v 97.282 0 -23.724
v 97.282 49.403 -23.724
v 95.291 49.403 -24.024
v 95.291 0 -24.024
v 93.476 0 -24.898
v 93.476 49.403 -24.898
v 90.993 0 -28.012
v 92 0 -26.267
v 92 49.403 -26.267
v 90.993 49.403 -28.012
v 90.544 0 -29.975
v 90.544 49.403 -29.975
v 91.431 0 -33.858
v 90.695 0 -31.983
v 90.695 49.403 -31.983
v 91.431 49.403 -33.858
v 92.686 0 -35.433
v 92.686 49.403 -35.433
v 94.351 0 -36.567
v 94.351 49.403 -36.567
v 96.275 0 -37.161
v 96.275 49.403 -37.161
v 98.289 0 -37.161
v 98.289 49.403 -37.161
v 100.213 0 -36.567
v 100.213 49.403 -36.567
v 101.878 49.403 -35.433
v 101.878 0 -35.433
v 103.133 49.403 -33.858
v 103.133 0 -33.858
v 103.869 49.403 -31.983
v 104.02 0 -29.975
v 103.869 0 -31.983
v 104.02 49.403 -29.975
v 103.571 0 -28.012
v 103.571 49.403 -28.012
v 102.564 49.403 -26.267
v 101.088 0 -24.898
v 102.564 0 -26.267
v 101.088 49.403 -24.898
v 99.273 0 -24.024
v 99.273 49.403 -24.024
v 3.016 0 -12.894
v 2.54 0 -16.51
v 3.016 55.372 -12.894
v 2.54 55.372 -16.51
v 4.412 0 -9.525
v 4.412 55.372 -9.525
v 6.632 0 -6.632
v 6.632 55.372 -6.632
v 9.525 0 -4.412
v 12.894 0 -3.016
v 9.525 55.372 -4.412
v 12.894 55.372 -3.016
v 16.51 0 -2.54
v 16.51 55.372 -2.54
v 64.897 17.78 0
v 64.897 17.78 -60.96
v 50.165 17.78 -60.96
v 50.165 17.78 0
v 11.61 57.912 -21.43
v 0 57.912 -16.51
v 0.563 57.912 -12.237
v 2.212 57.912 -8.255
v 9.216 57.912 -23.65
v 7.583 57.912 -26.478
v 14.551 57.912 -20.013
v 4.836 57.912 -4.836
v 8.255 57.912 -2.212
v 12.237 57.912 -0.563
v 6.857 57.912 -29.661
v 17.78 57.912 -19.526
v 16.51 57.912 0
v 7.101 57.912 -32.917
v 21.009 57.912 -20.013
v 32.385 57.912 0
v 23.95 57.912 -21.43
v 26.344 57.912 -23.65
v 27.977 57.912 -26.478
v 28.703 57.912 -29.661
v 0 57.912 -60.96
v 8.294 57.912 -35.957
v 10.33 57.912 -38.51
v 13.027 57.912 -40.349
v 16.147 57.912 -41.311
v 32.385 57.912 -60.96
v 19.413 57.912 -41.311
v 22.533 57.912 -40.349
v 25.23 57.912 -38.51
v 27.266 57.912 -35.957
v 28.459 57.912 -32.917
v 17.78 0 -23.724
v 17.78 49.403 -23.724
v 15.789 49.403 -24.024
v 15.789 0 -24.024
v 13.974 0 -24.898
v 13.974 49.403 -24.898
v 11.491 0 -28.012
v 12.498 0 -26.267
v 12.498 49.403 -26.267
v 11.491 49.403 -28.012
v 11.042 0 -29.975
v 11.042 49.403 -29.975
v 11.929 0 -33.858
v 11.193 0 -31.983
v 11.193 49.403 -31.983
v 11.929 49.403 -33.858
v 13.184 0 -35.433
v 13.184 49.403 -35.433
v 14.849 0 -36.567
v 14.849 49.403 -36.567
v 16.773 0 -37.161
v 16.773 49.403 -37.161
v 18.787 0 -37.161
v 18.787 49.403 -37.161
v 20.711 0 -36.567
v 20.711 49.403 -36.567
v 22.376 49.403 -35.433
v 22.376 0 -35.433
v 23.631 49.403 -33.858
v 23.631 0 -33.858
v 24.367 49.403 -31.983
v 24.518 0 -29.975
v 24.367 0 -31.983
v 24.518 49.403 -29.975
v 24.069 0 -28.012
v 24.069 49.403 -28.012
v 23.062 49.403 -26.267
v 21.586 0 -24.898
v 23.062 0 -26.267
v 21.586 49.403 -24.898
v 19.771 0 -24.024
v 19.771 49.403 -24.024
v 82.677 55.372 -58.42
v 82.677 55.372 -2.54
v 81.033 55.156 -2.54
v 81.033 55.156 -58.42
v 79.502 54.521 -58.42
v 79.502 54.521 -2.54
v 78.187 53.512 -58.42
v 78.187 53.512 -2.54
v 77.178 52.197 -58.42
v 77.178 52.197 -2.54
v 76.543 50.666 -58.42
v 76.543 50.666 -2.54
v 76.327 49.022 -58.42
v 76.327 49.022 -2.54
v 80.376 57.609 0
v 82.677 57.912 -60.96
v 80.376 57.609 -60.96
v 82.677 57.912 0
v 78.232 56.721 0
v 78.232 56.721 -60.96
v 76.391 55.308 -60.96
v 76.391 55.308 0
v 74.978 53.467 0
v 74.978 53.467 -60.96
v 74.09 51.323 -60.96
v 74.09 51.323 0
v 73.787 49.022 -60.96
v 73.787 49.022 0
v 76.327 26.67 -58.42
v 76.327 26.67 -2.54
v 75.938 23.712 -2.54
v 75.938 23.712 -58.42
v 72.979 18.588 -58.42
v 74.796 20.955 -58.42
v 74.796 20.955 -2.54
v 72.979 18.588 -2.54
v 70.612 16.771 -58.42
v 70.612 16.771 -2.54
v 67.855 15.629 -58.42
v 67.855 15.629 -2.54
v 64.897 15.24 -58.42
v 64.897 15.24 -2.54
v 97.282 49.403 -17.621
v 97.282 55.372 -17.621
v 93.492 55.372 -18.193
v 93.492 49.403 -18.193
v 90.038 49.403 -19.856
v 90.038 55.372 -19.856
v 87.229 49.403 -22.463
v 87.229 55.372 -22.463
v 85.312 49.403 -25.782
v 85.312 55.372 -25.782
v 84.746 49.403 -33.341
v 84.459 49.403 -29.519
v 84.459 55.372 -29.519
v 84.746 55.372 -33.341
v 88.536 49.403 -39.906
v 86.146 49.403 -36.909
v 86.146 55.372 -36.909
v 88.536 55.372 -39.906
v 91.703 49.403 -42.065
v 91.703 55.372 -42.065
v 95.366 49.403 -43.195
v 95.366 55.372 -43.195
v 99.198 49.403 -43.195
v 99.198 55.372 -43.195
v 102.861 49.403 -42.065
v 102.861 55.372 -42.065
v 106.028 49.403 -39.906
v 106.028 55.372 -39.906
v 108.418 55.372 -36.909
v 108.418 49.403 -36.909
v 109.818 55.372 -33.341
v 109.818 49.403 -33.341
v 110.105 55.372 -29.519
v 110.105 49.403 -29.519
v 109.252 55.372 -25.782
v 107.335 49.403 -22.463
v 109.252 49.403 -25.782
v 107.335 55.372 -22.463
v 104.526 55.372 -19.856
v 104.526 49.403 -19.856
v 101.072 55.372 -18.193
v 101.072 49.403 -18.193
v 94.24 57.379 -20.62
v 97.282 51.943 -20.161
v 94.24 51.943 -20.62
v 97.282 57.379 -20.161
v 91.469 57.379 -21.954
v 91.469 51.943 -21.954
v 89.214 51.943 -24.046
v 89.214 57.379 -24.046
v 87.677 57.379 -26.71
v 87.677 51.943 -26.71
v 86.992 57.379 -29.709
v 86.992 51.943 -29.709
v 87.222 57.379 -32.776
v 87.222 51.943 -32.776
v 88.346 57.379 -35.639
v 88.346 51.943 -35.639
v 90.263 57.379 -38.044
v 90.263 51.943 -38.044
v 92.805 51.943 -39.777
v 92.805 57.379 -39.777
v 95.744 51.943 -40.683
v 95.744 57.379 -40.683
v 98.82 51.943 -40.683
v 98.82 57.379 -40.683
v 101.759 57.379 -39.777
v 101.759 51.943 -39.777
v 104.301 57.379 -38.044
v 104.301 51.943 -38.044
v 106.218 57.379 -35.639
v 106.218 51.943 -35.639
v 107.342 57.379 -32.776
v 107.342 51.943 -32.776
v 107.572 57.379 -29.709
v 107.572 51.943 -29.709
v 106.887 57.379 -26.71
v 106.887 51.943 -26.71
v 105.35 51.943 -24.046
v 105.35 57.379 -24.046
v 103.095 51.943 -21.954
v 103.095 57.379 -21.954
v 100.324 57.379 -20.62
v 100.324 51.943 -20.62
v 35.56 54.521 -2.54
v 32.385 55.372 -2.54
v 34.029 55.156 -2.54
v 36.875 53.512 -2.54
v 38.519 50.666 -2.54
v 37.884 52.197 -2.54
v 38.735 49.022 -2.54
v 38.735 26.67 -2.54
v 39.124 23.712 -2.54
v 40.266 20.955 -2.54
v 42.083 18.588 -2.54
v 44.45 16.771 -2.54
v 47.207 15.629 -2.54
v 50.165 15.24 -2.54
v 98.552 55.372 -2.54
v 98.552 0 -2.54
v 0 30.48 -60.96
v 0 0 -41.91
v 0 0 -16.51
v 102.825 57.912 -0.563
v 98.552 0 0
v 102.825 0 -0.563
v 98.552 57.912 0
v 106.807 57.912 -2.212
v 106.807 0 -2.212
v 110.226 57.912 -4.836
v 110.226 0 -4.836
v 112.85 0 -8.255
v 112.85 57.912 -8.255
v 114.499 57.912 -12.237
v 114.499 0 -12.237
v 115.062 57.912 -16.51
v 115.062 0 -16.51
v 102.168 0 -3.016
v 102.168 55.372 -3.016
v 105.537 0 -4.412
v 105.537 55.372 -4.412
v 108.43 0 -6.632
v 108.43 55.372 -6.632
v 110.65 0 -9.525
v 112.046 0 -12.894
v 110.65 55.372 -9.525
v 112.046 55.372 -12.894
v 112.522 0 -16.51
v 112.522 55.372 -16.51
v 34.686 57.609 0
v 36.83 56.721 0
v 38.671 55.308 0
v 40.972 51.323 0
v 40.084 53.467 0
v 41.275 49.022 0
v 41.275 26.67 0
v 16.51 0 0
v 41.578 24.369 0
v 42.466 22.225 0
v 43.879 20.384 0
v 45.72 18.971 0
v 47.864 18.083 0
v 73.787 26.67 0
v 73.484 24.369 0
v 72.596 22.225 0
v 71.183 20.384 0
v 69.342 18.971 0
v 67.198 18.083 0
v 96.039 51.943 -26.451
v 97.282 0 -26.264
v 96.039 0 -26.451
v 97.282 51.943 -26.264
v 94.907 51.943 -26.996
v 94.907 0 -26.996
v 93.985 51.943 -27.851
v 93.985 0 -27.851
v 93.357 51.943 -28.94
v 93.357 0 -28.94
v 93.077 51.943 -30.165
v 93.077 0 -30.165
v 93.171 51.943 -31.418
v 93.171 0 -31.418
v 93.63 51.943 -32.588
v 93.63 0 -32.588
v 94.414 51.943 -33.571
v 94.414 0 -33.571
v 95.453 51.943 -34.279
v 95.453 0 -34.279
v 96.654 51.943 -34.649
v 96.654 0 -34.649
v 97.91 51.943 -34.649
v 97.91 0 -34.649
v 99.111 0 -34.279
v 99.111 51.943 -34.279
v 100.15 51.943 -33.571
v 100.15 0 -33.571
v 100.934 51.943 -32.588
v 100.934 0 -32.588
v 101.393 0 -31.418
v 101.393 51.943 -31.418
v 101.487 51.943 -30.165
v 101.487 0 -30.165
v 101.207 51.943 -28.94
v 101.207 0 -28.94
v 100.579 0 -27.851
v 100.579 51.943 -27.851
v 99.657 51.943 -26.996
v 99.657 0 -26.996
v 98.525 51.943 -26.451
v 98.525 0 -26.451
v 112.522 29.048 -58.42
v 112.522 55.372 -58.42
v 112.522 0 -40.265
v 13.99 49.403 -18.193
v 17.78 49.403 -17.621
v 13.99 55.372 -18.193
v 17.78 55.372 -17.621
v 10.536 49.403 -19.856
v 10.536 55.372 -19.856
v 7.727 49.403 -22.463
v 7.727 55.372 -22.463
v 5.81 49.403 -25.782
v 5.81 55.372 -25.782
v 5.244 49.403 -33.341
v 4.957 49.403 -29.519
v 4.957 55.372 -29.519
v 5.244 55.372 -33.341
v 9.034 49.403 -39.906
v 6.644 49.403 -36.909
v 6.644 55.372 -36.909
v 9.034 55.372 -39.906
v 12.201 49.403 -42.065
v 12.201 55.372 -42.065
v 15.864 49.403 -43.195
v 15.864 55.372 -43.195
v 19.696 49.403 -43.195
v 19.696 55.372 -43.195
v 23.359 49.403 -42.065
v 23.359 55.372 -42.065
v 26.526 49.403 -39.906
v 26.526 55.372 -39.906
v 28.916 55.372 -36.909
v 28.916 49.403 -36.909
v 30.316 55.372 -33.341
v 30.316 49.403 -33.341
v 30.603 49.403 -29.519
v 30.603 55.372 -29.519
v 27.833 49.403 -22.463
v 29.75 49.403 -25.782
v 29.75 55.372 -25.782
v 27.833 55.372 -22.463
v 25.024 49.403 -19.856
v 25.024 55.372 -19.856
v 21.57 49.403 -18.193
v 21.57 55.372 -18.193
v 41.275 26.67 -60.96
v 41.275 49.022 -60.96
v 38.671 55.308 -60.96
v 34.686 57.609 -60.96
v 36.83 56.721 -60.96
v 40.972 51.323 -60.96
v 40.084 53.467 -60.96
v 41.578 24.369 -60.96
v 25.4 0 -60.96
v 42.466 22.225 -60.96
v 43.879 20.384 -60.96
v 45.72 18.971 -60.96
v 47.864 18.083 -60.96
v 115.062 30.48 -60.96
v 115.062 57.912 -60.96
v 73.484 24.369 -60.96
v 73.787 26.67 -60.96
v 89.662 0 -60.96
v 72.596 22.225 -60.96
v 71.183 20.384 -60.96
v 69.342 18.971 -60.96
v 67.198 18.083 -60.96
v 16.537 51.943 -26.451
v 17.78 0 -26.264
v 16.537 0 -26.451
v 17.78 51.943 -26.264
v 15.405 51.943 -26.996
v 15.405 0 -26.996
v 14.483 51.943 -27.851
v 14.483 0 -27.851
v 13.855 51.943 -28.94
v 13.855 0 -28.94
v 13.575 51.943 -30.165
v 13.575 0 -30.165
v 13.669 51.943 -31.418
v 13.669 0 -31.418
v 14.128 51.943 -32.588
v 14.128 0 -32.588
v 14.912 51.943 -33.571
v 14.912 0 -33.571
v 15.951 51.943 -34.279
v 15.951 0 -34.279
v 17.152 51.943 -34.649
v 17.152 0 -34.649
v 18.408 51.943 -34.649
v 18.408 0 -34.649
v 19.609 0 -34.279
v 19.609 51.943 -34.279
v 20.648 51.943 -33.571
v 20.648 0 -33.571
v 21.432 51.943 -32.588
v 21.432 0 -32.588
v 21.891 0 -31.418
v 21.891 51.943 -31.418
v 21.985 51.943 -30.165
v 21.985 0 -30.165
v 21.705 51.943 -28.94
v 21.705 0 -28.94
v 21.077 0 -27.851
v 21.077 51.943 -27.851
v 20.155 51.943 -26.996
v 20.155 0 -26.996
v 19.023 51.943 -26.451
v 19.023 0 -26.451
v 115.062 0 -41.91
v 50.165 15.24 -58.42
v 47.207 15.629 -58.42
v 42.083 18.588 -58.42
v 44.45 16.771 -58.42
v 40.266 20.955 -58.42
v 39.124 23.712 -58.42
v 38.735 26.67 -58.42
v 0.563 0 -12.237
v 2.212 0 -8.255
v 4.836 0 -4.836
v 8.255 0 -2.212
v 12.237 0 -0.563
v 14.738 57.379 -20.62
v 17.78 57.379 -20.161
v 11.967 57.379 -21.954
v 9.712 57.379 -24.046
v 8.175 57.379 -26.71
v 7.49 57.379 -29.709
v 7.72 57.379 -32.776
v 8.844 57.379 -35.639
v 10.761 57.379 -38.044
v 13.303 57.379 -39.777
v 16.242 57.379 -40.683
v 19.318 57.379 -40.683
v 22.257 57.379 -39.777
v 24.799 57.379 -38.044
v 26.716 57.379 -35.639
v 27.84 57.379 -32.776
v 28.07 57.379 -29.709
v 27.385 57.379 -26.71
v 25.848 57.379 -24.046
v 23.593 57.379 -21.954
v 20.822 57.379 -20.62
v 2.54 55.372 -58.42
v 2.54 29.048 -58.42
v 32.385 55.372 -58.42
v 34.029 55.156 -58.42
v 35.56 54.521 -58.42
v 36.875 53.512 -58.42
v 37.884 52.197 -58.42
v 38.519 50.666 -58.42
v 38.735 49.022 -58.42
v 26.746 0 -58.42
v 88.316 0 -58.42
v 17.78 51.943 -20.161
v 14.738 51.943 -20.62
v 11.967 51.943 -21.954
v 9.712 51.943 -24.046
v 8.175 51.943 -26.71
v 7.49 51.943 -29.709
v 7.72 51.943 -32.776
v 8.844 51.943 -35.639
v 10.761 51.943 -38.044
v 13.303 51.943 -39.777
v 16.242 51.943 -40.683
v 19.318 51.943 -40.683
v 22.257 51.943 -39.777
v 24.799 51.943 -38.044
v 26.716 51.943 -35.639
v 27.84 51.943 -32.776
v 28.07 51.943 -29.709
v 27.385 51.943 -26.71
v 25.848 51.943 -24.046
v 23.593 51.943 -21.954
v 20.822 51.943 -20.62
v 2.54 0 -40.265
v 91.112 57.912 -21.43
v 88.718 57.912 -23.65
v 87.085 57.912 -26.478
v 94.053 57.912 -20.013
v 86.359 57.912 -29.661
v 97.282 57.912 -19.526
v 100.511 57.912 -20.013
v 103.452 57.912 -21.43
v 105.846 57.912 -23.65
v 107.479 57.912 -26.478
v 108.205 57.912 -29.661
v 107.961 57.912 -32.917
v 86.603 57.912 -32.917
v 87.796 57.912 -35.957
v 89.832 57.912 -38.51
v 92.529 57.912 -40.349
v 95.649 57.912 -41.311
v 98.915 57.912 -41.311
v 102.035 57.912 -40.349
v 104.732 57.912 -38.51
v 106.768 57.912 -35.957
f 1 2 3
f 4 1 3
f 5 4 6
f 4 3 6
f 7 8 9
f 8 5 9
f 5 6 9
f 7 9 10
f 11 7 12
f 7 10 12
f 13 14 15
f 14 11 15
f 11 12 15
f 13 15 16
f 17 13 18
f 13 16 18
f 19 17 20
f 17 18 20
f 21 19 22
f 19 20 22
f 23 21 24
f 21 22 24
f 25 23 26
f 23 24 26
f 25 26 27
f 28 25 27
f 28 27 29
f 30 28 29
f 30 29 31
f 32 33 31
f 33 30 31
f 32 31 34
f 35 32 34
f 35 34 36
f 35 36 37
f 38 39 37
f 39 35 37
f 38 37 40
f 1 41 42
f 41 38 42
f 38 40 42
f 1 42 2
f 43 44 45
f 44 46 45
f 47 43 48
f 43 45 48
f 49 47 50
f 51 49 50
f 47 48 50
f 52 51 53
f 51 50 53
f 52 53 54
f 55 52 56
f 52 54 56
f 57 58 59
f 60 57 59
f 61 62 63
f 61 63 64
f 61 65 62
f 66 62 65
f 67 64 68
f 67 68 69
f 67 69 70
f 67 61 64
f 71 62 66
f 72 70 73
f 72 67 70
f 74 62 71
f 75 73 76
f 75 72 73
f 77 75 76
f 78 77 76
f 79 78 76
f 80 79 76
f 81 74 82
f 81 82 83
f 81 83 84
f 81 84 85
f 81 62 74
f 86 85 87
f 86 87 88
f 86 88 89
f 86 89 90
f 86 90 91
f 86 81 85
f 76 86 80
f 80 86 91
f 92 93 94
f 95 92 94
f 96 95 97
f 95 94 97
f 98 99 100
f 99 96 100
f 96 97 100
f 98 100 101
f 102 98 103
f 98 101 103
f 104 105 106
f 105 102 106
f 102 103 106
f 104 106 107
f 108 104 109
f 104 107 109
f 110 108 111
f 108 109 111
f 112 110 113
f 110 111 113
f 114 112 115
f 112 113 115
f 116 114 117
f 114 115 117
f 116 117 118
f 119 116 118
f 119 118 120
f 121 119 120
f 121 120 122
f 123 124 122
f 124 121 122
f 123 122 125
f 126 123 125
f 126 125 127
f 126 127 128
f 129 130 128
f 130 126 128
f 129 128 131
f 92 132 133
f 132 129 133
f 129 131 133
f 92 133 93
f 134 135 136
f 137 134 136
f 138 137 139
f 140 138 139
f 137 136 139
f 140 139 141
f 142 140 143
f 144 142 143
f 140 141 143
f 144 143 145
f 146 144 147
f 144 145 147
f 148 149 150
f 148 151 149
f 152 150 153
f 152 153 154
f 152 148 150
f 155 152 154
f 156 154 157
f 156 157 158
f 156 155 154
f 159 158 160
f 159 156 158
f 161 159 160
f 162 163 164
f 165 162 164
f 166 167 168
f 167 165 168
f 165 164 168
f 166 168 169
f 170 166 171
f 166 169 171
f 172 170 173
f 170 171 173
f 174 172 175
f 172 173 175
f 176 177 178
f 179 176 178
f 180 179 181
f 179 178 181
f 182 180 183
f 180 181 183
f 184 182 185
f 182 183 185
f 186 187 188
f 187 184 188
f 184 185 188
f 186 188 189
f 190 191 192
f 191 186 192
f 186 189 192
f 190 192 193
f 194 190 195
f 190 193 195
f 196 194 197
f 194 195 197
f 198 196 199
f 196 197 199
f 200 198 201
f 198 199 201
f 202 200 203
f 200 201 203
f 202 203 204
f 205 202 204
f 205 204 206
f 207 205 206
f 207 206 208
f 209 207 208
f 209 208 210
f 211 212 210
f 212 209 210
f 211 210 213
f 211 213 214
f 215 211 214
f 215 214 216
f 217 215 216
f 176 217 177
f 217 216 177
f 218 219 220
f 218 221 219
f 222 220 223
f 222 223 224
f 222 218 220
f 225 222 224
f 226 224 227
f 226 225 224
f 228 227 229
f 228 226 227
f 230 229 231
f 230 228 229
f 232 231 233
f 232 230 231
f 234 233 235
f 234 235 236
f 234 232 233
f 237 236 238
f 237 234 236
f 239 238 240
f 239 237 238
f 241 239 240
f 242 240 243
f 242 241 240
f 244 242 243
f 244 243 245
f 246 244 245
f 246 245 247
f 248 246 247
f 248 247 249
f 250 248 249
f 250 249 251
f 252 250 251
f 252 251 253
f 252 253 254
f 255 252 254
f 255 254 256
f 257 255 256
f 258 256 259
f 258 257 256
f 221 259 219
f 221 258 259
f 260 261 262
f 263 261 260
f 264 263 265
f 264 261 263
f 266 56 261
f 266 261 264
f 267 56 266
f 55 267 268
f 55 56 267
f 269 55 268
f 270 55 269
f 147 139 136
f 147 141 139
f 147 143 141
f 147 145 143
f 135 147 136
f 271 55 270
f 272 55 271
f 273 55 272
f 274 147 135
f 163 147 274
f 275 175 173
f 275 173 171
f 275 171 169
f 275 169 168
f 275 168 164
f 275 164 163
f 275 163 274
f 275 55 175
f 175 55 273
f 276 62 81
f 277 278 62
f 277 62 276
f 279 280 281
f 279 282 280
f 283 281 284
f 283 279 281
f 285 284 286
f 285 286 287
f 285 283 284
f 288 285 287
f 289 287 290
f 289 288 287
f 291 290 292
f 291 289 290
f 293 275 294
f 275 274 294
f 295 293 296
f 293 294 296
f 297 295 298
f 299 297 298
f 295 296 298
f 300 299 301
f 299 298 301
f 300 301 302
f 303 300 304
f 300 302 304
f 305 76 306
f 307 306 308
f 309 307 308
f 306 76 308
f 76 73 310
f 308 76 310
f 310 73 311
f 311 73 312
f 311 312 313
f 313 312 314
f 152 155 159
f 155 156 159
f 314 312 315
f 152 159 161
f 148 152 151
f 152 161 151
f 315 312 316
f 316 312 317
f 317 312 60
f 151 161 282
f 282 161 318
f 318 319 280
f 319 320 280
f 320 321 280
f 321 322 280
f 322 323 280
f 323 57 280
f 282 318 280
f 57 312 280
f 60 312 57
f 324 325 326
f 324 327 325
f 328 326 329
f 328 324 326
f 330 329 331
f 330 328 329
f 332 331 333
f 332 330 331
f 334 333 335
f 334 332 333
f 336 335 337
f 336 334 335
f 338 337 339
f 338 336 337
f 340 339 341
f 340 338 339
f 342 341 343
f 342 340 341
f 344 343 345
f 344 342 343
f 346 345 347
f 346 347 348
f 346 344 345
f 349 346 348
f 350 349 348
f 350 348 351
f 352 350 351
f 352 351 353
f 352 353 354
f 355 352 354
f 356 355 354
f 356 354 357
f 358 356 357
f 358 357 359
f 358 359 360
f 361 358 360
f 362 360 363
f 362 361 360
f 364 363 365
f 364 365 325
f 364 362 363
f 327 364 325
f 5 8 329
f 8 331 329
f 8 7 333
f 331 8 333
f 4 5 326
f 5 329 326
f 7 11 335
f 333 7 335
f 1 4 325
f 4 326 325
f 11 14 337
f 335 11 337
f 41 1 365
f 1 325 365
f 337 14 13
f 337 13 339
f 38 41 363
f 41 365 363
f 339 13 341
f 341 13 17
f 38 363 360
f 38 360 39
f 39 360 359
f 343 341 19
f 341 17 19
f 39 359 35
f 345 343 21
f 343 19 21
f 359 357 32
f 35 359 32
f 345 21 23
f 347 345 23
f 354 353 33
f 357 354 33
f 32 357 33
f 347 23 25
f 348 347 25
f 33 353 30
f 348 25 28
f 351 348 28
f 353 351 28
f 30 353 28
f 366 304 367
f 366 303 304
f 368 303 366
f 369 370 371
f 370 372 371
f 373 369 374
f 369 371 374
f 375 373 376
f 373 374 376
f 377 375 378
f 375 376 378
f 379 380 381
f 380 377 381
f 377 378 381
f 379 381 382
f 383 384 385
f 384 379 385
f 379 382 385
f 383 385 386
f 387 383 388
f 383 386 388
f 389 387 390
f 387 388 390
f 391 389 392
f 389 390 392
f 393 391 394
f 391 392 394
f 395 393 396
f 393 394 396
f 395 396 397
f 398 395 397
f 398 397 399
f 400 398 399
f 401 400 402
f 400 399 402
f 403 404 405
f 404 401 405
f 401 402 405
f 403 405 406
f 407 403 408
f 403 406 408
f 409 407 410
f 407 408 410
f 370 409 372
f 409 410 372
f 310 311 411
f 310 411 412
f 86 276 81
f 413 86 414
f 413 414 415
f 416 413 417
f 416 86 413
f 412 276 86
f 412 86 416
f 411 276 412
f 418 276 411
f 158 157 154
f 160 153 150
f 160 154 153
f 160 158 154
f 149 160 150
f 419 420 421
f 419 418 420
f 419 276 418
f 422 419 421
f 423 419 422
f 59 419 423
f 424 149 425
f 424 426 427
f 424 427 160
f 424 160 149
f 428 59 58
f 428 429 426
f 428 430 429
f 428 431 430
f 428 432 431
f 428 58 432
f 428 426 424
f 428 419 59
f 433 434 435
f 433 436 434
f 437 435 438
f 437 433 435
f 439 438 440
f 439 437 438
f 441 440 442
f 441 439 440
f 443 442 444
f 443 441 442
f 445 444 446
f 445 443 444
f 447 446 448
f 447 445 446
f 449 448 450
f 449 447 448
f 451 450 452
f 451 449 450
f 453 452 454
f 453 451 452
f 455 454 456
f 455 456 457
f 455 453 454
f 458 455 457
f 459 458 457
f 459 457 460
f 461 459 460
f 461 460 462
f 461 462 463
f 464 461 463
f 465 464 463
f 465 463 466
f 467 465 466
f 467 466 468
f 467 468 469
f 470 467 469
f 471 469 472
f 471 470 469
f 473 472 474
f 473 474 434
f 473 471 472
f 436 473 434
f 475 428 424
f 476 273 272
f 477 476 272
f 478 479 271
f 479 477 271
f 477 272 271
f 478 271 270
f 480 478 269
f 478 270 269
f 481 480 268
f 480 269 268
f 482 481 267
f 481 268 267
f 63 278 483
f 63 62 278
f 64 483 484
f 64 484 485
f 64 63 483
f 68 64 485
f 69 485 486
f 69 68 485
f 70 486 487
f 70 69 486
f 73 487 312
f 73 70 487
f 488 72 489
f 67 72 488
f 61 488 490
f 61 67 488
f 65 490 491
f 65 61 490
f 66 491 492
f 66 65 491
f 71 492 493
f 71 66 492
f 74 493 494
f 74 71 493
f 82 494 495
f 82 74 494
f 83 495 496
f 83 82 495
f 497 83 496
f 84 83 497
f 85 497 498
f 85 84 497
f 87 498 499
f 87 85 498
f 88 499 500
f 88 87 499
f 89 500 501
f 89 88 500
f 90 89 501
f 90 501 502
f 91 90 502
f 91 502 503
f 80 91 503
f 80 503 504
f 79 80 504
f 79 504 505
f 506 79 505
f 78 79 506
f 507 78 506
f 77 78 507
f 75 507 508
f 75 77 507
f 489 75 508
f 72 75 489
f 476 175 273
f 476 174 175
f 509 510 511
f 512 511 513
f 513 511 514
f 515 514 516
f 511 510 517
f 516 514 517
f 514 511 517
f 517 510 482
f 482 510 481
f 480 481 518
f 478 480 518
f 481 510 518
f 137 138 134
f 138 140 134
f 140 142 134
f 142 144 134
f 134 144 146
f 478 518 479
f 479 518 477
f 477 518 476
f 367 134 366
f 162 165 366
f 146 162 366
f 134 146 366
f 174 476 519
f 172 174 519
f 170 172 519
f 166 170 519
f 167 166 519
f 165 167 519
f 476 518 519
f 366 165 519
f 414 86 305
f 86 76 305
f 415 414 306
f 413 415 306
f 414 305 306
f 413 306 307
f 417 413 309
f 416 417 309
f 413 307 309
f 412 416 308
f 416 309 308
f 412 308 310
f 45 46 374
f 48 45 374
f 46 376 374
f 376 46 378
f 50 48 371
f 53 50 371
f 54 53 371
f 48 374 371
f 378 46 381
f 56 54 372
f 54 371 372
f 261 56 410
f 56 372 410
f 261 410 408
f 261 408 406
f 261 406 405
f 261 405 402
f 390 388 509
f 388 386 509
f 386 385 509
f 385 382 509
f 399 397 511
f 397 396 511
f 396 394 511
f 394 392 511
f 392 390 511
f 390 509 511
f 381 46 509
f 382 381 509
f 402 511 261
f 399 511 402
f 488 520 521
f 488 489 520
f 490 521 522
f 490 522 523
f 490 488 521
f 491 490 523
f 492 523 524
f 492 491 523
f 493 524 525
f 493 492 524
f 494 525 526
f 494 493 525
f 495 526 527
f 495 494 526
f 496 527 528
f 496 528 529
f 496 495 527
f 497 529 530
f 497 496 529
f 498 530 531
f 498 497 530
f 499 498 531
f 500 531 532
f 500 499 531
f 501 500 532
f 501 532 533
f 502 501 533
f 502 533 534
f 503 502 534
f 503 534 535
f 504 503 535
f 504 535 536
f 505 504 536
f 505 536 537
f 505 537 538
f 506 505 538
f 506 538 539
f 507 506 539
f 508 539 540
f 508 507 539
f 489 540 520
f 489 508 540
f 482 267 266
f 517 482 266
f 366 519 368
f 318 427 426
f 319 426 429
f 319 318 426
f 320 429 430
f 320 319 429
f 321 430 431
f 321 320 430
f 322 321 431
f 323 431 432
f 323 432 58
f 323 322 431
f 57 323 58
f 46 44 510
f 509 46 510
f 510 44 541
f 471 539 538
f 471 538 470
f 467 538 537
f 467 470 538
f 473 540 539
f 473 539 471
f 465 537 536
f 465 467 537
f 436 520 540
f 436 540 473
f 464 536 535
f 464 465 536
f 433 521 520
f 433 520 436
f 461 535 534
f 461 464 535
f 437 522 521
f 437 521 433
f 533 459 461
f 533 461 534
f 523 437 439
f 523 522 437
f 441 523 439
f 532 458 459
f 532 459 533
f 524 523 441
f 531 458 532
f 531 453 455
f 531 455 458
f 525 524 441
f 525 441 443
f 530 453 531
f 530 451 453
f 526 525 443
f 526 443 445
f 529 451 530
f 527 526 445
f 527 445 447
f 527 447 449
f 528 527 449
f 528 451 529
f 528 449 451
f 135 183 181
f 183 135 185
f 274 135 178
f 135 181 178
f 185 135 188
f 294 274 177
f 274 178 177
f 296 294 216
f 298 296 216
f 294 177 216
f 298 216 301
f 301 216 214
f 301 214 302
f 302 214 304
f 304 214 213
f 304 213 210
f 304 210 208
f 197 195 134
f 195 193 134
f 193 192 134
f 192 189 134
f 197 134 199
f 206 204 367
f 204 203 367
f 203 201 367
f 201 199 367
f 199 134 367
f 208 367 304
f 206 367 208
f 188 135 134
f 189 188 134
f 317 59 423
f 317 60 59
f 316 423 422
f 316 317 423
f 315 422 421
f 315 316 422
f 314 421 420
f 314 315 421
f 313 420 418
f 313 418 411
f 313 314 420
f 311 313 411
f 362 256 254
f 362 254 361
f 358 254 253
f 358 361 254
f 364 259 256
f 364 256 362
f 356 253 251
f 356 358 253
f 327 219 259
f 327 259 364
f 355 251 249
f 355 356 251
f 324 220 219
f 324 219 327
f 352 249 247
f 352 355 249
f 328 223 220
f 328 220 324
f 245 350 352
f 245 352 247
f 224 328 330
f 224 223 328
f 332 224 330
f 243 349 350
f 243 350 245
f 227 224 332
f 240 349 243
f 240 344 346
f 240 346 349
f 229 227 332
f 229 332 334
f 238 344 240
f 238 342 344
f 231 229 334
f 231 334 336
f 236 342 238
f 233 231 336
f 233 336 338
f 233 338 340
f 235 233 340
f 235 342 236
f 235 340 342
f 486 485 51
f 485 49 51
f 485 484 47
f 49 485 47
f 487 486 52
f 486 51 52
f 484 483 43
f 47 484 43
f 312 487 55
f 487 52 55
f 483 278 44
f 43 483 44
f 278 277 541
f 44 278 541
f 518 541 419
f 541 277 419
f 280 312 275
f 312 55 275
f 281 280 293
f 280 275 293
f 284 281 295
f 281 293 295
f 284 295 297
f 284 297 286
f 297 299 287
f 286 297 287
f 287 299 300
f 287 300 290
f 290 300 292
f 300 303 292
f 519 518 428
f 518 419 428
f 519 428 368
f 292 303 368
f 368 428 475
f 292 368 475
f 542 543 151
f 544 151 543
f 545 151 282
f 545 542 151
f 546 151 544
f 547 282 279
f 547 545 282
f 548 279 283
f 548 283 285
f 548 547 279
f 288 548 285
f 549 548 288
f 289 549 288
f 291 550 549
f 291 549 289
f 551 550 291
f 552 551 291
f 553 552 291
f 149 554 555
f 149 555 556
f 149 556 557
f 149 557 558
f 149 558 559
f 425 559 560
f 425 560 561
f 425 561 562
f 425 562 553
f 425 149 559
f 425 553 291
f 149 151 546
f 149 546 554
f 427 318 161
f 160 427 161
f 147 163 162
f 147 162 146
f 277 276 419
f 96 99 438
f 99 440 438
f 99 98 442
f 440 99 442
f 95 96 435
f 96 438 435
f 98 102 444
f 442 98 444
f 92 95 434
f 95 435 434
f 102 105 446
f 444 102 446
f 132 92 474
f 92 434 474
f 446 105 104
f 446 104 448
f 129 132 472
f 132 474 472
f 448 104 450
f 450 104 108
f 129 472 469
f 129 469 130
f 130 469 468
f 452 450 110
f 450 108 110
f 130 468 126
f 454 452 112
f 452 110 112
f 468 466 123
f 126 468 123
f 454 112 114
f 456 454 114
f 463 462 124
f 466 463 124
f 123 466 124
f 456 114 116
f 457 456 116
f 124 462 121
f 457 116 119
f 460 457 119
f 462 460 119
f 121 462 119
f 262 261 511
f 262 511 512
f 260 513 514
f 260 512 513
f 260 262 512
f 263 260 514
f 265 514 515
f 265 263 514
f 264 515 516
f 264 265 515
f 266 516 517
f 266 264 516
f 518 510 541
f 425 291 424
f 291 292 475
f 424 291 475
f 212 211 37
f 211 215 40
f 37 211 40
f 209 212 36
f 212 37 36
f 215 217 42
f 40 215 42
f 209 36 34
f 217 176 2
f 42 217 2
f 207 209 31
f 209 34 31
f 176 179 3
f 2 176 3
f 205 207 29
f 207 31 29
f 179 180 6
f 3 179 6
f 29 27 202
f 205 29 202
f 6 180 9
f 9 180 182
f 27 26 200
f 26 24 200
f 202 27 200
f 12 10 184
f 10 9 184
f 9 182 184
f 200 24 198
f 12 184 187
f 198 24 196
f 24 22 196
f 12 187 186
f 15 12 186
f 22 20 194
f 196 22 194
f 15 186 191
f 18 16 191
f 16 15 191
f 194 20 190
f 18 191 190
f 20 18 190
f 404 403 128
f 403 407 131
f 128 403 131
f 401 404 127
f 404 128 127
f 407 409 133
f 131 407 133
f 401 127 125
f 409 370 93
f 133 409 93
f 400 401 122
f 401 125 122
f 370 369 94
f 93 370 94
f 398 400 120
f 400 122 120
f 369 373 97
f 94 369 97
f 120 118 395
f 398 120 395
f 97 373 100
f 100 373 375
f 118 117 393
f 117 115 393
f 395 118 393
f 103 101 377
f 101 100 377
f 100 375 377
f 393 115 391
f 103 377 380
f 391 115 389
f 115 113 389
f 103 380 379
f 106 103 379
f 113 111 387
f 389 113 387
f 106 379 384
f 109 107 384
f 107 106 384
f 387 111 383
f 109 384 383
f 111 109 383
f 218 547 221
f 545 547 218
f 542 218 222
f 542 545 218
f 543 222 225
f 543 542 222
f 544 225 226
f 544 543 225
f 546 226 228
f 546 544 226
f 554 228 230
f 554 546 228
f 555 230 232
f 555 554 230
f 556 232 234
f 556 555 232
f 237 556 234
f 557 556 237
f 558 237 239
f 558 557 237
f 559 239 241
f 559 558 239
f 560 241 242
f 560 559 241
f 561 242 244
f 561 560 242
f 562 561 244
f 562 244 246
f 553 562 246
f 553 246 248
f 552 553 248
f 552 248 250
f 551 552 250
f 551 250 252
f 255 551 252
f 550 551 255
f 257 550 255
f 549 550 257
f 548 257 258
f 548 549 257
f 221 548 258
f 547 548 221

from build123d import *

# Parameters (mm, degrees)
SKETCH1_W                                = 115.062
SKETCH1_H                                = 60.96
BOSS_EXTRUDE1_DEPTH                      = 57.912
SKETCH3_W                                = 32.512
SKETCH3_H                                = 40.132
CUT_EXTRUDE1_DEPTH                       = 79.502
FILLET1_R                                = 16.51
FILLET2_R                                = 8.89
CBORE_FOR_5_16_HEX_HEAD_BOLT1_AT_2_COUNT = 2
CBORE_FOR_5_16_HEX_HEAD_BOLT1_AT_2_PITCH = 79.502
MIRROR1_START                            = -43.619425251
MIRROR1_OUTLINE_W                        = 33
MIRROR1_OUTLINE_H                        = 39
MIRROR1_DEPTH                            = 13.631070391
SHELL1_T                                 = -2.54


# Read off the part's stored shape, not the designer's step: Mirror1
with BuildPart() as part:
    # Sketch1 → Boss-Extrude1 (new body)
    with BuildSketch(Plane(origin=(0, 0, 0), x_dir=(1, 0, 0), z_dir=(0, 1, 0))):
        with Locations((57.531, 30.48)):
            Rectangle(SKETCH1_W, SKETCH1_H)
    extrude(amount=BOSS_EXTRUDE1_DEPTH)

    # Sketch3 → Cut-Extrude1 (cut)
    with BuildSketch(Plane(origin=(0, 0, -60.96), x_dir=(-1, 0, 0), z_dir=(0, 0, -1))):
        with Locations((-57.531, 37.846)):
            Rectangle(SKETCH3_W, SKETCH3_H)
    extrude(amount=-CUT_EXTRUDE1_DEPTH, mode=Mode.SUBTRACT)

    # Fillet1
    fillet1_edges = [part.edges().sort_by_distance(p)[0] for p in [
        (115.062, 28.956, 0),
        (0, 28.956, 0),
    ]]
    fillet(fillet1_edges, radius=FILLET1_R)

    # Fillet2
    fillet2_edges = [part.edges().sort_by_distance(p)[0] for p in [
        (73.787, 57.912, -30.48),
        (41.275, 57.912, -30.48),
        (41.275, 17.78, -30.48),
        (73.787, 17.78, -30.48),
    ]]
    fillet(fillet2_edges, radius=FILLET2_R)

    # Sketch5 → CBORE for 5/16 Hex Head Bolt1 (revolve, cut)
    with BuildSketch(Plane(origin=(17.78, 57.912, -30.48), x_dir=(0, 0, 1), z_dir=(1, 0, 0))):
        Polygon((0, 0), (0, 57.912), (4.2164, 57.912), (4.2164, 5.969), (10.31875, 5.969), (10.31875, 0.532828266), (10.95375, 0), align=None)
    cbore_for_5_16_hex_head_bolt1 = revolve(axis=Axis((17.78, 64.262, -30.48), (0, -1, 0)), mode=Mode.SUBTRACT)

    # CBORE for 5/16 Hex Head Bolt1 at 2: CBORE for 5/16 Hex Head Bolt1 ×2
    with Locations(*[(i * CBORE_FOR_5_16_HEX_HEAD_BOLT1_AT_2_PITCH, 0, 0) for i in range(1, CBORE_FOR_5_16_HEX_HEAD_BOLT1_AT_2_COUNT)]):
        add(cbore_for_5_16_hex_head_bolt1, mode=Mode.SUBTRACT)

    # SurfaceCut1
    split(bisect_by=Plane(origin=(49.231296, -41.02608, -65.641728), x_dir=(0.8438009243891594, 0.2844272778839867, 0.45508364461437806), z_dir=(-0.5366563145999497, 0.44721359549995837, 0.7155417527999325)), keep=Keep.TOP)

    # Mirror1 outline → Mirror1 (cut)
    with BuildSketch(Plane(origin=(0, 0, 0), x_dir=(0.8438009243891591, -0.284427277883987, -0.4550836446143786), z_dir=(0.5366563145999501, 0.4472135954999582, 0.7155417527999323)).offset(MIRROR1_START)):
        with Locations((34.5, 40.5)):
            Rectangle(MIRROR1_OUTLINE_W, MIRROR1_OUTLINE_H)
    extrude(amount=MIRROR1_DEPTH, mode=Mode.SUBTRACT)

    # Shell1
    shell1_openings = [part.faces().sort_by_distance(p)[0] for p in [
        (57.531, 0, -29.124585382),
    ]]
    offset(amount=SHELL1_T, openings=shell1_openings, kind=Kind.INTERSECTION)


solid = part.part
